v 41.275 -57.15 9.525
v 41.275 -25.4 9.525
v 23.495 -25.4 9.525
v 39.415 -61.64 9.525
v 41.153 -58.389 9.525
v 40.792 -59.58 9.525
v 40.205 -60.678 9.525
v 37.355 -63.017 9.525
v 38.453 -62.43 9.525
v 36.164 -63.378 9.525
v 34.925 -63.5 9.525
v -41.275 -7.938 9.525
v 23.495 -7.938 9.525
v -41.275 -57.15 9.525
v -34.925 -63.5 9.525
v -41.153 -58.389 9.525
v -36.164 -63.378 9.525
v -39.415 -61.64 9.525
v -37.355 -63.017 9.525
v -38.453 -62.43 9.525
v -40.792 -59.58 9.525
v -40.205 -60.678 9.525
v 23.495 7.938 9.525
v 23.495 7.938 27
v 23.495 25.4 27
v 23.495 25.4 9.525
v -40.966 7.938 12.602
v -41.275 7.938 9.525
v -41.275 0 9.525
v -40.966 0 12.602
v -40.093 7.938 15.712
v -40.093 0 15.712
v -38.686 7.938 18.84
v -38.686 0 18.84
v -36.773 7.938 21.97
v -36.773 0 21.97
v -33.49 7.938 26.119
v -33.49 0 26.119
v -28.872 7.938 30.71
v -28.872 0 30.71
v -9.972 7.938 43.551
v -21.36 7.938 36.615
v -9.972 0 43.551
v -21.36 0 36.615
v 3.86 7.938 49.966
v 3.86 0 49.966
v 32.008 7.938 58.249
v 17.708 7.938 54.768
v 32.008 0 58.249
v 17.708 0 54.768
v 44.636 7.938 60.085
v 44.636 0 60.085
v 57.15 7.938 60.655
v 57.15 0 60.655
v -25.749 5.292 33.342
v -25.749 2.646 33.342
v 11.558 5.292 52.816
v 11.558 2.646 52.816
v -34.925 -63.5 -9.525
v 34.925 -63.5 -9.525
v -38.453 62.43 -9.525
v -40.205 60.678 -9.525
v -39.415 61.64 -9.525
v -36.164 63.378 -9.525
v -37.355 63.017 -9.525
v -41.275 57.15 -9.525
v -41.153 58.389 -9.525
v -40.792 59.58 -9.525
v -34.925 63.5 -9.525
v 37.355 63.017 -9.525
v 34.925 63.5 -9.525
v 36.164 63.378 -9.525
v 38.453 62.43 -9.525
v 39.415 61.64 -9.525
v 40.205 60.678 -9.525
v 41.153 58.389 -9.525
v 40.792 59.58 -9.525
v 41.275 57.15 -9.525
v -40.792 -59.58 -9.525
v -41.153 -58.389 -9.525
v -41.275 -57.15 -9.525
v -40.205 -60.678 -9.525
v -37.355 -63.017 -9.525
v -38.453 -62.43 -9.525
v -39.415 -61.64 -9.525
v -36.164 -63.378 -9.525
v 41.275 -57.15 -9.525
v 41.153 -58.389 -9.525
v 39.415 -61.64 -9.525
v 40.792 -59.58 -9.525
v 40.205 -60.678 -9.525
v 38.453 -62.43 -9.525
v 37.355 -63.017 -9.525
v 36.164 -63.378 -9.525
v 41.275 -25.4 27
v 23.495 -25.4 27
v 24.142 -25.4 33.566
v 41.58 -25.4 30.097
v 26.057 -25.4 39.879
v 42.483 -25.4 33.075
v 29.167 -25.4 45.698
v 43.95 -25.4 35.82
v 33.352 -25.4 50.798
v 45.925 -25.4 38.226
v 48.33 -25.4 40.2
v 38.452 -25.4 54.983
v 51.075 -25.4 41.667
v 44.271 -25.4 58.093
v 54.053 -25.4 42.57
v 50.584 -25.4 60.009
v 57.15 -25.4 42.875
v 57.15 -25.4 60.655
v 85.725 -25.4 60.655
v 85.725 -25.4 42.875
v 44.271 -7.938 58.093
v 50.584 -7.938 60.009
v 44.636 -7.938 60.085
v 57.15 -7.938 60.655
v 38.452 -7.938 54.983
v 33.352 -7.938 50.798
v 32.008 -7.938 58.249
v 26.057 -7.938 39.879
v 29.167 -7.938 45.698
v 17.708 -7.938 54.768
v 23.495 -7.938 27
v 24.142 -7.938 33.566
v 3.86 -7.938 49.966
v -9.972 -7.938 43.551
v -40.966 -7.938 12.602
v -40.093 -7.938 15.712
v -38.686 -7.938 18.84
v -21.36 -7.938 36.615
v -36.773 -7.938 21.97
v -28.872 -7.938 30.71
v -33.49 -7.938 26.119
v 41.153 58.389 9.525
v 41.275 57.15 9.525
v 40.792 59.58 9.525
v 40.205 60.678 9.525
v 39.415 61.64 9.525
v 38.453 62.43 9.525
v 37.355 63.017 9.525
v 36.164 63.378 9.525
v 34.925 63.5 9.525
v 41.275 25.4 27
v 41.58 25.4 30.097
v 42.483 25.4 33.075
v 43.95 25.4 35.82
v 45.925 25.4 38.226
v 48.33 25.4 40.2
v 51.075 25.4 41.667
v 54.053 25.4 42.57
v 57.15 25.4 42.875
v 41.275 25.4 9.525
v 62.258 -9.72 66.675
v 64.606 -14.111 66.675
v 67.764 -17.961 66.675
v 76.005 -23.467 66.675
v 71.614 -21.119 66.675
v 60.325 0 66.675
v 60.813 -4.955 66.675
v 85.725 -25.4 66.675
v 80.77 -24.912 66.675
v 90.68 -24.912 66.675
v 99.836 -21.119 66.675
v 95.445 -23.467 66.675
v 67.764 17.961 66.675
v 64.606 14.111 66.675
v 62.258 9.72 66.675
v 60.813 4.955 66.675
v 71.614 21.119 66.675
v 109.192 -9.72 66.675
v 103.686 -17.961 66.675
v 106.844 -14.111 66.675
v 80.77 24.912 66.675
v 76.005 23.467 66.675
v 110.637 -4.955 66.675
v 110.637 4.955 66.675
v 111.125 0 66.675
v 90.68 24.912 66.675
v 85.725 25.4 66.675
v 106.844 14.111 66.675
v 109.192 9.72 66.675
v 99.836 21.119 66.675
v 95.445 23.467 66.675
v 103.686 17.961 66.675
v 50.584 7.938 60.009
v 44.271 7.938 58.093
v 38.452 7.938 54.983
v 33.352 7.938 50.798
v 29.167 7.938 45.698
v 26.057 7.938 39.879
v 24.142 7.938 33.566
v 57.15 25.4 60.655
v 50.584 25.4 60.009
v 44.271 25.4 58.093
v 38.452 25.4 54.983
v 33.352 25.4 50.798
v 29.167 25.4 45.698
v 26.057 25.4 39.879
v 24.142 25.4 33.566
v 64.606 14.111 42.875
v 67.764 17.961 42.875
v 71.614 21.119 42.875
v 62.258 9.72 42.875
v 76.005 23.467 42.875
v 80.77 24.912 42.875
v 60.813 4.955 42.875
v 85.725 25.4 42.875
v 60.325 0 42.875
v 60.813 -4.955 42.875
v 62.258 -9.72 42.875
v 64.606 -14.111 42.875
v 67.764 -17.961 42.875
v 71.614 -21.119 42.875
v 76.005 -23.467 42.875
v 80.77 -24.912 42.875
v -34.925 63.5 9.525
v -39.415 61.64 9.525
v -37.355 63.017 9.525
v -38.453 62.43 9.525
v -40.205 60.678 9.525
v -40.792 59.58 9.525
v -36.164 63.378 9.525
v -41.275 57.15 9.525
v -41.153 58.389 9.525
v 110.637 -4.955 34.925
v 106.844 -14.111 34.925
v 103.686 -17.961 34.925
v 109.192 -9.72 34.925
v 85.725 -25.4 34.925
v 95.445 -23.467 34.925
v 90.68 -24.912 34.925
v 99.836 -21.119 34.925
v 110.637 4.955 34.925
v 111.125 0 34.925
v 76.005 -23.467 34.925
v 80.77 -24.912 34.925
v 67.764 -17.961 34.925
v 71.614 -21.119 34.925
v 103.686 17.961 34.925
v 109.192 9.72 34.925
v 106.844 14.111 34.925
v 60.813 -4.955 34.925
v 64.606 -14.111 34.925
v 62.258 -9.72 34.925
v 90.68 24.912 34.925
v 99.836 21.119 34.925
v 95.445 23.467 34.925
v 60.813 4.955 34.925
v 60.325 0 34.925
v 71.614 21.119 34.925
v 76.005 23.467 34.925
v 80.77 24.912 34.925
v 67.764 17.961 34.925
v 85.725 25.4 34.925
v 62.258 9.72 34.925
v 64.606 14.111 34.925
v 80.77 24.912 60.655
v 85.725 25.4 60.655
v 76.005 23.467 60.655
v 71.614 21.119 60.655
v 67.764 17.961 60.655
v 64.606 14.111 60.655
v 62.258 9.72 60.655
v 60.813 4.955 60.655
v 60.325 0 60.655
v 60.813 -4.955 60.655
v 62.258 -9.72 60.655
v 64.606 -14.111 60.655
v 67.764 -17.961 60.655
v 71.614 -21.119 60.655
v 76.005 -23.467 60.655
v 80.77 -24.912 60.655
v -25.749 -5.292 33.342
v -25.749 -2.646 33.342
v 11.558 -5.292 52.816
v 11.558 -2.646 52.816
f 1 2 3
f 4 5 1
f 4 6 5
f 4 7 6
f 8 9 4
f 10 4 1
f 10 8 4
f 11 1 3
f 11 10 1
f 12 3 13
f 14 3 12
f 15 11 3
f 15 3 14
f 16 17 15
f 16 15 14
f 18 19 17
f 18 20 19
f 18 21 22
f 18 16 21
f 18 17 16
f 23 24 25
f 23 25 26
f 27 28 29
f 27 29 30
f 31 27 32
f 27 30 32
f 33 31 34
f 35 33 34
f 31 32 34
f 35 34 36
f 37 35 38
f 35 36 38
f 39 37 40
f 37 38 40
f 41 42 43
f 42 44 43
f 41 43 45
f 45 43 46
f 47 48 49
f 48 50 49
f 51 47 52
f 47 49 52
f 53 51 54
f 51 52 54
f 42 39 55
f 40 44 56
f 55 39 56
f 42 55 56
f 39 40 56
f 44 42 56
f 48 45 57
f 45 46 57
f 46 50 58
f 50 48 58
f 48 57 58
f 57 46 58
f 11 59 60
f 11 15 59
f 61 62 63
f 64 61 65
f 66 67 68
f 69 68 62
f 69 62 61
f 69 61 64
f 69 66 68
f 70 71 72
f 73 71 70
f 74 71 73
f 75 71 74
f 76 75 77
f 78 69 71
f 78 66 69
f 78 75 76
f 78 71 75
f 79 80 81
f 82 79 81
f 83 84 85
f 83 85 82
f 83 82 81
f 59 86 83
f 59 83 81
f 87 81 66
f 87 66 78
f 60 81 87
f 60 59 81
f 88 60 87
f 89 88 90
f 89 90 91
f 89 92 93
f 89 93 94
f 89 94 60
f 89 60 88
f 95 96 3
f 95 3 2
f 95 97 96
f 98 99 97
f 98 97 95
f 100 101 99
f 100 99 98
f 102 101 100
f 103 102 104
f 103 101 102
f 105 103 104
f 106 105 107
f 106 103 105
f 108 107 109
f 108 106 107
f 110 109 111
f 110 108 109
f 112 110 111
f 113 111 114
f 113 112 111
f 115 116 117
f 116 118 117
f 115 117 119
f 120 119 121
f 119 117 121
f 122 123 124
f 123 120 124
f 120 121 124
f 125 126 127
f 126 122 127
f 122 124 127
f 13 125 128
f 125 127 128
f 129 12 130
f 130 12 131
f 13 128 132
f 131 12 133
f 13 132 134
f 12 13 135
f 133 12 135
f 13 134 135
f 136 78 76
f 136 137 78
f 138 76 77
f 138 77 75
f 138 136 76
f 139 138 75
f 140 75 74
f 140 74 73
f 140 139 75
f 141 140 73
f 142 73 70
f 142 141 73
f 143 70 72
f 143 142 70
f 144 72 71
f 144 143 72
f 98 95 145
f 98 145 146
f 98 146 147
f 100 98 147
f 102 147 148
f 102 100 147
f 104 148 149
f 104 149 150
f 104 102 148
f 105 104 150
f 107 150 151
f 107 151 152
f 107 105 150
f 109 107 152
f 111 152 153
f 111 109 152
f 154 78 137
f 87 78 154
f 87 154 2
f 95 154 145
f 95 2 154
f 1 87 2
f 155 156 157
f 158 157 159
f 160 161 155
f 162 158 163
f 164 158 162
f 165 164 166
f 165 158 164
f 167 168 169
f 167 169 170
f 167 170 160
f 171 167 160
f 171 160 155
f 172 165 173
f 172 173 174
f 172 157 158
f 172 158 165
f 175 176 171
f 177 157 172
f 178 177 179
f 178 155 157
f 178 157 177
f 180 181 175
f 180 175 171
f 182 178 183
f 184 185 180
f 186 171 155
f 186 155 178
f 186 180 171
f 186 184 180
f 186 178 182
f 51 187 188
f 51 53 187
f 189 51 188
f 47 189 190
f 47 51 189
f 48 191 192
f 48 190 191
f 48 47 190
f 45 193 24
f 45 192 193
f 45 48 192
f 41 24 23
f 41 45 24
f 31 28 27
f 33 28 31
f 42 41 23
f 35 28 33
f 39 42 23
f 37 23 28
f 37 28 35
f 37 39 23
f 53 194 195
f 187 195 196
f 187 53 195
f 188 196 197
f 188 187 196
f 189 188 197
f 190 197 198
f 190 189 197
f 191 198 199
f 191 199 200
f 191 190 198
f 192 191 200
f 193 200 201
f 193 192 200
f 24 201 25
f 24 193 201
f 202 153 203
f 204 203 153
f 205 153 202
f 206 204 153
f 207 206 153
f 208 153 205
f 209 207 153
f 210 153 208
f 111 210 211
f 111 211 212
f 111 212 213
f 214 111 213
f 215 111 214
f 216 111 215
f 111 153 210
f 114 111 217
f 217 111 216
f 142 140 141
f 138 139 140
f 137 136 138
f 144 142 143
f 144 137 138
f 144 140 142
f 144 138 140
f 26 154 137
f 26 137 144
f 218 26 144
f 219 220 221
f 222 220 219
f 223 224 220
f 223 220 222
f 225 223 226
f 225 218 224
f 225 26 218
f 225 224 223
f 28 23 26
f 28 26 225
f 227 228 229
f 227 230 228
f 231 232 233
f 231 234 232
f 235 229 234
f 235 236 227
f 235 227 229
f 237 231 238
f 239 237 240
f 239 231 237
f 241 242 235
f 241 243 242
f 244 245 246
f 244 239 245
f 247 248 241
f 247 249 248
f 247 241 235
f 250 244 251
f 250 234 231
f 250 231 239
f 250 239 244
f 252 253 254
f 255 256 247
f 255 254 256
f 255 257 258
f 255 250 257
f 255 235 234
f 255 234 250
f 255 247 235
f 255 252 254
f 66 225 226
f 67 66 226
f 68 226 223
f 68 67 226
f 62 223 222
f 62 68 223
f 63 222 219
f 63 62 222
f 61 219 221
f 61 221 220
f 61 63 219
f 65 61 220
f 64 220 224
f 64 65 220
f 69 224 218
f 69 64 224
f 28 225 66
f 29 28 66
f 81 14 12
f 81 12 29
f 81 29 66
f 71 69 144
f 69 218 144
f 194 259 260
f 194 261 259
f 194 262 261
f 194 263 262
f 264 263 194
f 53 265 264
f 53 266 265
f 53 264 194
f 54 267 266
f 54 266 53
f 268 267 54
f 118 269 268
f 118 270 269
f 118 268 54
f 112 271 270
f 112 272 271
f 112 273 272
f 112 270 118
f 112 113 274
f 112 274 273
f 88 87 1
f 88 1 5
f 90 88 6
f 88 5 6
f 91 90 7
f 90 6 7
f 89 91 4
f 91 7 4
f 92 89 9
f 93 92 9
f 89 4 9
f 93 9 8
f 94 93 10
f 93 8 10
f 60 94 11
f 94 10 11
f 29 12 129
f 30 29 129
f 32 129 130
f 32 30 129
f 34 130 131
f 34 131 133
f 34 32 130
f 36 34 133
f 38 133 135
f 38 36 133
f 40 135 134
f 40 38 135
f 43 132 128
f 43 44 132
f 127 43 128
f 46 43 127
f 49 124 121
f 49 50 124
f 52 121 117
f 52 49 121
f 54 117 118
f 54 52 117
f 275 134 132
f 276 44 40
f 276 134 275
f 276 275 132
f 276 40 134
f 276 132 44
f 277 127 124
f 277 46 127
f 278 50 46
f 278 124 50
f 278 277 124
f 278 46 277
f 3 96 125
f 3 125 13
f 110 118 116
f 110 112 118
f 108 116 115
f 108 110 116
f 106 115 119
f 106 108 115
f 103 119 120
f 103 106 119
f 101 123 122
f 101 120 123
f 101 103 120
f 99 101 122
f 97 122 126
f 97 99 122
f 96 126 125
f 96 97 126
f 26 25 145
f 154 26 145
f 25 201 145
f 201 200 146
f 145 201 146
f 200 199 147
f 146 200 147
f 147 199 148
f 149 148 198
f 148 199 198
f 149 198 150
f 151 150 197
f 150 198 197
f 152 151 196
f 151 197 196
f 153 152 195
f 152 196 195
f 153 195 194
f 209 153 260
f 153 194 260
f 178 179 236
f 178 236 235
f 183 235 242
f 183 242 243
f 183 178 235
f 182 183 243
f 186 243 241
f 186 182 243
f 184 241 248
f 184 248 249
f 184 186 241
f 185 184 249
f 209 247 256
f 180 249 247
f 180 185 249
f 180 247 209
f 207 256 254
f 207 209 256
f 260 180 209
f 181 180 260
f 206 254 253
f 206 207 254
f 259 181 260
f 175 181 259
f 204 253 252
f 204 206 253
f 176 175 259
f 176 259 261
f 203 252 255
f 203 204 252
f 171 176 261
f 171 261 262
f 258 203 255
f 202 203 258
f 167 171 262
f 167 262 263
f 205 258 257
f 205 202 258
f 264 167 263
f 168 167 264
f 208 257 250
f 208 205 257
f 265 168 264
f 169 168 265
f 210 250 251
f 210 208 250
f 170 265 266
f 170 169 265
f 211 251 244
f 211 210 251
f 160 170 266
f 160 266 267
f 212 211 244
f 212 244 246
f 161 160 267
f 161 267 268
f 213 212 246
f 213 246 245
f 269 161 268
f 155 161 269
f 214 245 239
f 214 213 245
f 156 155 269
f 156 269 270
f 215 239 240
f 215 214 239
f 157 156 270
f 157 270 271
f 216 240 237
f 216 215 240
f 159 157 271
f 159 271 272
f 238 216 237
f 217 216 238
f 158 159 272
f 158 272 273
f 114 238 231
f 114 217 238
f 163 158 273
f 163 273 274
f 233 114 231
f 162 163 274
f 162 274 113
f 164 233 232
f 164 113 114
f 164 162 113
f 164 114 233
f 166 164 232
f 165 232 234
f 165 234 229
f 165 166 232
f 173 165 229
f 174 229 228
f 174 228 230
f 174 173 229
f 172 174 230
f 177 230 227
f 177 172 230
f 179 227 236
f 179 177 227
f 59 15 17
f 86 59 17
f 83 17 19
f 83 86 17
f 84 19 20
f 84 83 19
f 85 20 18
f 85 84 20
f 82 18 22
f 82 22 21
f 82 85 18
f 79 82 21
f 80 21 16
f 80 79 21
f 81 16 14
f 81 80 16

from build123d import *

# Parameters (mm, degrees)
F1_DEPTH = 63.5
F0_W     = 25.4
F0_H     = 17.7799989994
F2_DEPTH = 25.4
F3_DEPTH = 7.9375
F5_R     = 6.35


with BuildPart() as f1:
    # F0 (on Front) → F1 (new body, symmetric)
    with BuildSketch(Plane.XZ):
        Polygon((-41.275, 9.525), (-41.275, -9.525), (41.275, -9.525), (41.275, -7.9502), (41.275, 9.525), (23.4950010006, 9.525), align=None)
    extrude(amount=F1_DEPTH, both=True)

    # F0 (on Front) → F2 (join, symmetric)
    with BuildSketch(Plane.XZ):
        with BuildLine():
            Line((23.4950010006, 27.0002), (23.4950010006, 9.525))
            Line((23.4950010006, 9.525), (41.275, 9.525))
            Line((41.275, 9.525), (41.275, 27.0002))
            ThreePointArc((41.275, 27.0002), (45.9246798487, 38.2255201513), (57.15, 42.8752))
            Line((57.15, 42.8752), (60.325, 42.8752))
            Line((60.325, 42.8752), (60.325, 60.6551989994))
            Line((60.325, 60.6551989994), (57.15, 60.6551989994))
            ThreePointArc((57.15, 60.6551989994), (33.3523219867, 50.7978780133), (23.4950010006, 27.0002))
        make_face()
        with Locations((73.025, 51.7651994997)):
            Rectangle(F0_W, F0_H)
    extrude(amount=F2_DEPTH, both=True)

    # F0 (on Front) → F3 (join, symmetric)
    with BuildSketch(Plane.XZ):
        with BuildLine():
            add(Edge.make_bspline(
                [(-41.275, 9.525), (-41.1387570202, 33.0824591219), (11.9141172618, 61.0640980303), (57.15, 60.6551989994)],
                knots=[0, 0, 0, 0, 110.9133800527, 110.9133800527, 110.9133800527, 110.9133800527], degree=3))
            Line((-41.275, 9.525), (23.4950010006, 9.525))
            Line((23.4950010006, 9.525), (23.4950010006, 27.0002))
            ThreePointArc((23.4950010006, 27.0002), (33.3523219867, 50.7978780133), (57.15, 60.6551989994))
        make_face()
    extrude(amount=F3_DEPTH, both=True)

    # F0 (on Front) → F4 (revolve)
    with BuildSketch(Plane.XZ):
        Polygon((85.725, 66.675), (85.725, 60.6551989994), (85.725, 42.8752), (85.725, 34.925), (111.125, 34.925), (111.125, 66.675), align=None)
    revolve(axis=Axis((85.725, 0, 50.8), (0, 0, 1)))

    # F5
    f5_edges = [f1.edges().sort_by_distance(p)[0] for p in [
        (41.275, -63.5, 0),
        (-41.275, -63.5, 0),
        (41.275, 63.5, 0),
        (-41.275, 63.5, 0),
    ]]
    fillet(f5_edges, radius=F5_R)


solid = f1.part
